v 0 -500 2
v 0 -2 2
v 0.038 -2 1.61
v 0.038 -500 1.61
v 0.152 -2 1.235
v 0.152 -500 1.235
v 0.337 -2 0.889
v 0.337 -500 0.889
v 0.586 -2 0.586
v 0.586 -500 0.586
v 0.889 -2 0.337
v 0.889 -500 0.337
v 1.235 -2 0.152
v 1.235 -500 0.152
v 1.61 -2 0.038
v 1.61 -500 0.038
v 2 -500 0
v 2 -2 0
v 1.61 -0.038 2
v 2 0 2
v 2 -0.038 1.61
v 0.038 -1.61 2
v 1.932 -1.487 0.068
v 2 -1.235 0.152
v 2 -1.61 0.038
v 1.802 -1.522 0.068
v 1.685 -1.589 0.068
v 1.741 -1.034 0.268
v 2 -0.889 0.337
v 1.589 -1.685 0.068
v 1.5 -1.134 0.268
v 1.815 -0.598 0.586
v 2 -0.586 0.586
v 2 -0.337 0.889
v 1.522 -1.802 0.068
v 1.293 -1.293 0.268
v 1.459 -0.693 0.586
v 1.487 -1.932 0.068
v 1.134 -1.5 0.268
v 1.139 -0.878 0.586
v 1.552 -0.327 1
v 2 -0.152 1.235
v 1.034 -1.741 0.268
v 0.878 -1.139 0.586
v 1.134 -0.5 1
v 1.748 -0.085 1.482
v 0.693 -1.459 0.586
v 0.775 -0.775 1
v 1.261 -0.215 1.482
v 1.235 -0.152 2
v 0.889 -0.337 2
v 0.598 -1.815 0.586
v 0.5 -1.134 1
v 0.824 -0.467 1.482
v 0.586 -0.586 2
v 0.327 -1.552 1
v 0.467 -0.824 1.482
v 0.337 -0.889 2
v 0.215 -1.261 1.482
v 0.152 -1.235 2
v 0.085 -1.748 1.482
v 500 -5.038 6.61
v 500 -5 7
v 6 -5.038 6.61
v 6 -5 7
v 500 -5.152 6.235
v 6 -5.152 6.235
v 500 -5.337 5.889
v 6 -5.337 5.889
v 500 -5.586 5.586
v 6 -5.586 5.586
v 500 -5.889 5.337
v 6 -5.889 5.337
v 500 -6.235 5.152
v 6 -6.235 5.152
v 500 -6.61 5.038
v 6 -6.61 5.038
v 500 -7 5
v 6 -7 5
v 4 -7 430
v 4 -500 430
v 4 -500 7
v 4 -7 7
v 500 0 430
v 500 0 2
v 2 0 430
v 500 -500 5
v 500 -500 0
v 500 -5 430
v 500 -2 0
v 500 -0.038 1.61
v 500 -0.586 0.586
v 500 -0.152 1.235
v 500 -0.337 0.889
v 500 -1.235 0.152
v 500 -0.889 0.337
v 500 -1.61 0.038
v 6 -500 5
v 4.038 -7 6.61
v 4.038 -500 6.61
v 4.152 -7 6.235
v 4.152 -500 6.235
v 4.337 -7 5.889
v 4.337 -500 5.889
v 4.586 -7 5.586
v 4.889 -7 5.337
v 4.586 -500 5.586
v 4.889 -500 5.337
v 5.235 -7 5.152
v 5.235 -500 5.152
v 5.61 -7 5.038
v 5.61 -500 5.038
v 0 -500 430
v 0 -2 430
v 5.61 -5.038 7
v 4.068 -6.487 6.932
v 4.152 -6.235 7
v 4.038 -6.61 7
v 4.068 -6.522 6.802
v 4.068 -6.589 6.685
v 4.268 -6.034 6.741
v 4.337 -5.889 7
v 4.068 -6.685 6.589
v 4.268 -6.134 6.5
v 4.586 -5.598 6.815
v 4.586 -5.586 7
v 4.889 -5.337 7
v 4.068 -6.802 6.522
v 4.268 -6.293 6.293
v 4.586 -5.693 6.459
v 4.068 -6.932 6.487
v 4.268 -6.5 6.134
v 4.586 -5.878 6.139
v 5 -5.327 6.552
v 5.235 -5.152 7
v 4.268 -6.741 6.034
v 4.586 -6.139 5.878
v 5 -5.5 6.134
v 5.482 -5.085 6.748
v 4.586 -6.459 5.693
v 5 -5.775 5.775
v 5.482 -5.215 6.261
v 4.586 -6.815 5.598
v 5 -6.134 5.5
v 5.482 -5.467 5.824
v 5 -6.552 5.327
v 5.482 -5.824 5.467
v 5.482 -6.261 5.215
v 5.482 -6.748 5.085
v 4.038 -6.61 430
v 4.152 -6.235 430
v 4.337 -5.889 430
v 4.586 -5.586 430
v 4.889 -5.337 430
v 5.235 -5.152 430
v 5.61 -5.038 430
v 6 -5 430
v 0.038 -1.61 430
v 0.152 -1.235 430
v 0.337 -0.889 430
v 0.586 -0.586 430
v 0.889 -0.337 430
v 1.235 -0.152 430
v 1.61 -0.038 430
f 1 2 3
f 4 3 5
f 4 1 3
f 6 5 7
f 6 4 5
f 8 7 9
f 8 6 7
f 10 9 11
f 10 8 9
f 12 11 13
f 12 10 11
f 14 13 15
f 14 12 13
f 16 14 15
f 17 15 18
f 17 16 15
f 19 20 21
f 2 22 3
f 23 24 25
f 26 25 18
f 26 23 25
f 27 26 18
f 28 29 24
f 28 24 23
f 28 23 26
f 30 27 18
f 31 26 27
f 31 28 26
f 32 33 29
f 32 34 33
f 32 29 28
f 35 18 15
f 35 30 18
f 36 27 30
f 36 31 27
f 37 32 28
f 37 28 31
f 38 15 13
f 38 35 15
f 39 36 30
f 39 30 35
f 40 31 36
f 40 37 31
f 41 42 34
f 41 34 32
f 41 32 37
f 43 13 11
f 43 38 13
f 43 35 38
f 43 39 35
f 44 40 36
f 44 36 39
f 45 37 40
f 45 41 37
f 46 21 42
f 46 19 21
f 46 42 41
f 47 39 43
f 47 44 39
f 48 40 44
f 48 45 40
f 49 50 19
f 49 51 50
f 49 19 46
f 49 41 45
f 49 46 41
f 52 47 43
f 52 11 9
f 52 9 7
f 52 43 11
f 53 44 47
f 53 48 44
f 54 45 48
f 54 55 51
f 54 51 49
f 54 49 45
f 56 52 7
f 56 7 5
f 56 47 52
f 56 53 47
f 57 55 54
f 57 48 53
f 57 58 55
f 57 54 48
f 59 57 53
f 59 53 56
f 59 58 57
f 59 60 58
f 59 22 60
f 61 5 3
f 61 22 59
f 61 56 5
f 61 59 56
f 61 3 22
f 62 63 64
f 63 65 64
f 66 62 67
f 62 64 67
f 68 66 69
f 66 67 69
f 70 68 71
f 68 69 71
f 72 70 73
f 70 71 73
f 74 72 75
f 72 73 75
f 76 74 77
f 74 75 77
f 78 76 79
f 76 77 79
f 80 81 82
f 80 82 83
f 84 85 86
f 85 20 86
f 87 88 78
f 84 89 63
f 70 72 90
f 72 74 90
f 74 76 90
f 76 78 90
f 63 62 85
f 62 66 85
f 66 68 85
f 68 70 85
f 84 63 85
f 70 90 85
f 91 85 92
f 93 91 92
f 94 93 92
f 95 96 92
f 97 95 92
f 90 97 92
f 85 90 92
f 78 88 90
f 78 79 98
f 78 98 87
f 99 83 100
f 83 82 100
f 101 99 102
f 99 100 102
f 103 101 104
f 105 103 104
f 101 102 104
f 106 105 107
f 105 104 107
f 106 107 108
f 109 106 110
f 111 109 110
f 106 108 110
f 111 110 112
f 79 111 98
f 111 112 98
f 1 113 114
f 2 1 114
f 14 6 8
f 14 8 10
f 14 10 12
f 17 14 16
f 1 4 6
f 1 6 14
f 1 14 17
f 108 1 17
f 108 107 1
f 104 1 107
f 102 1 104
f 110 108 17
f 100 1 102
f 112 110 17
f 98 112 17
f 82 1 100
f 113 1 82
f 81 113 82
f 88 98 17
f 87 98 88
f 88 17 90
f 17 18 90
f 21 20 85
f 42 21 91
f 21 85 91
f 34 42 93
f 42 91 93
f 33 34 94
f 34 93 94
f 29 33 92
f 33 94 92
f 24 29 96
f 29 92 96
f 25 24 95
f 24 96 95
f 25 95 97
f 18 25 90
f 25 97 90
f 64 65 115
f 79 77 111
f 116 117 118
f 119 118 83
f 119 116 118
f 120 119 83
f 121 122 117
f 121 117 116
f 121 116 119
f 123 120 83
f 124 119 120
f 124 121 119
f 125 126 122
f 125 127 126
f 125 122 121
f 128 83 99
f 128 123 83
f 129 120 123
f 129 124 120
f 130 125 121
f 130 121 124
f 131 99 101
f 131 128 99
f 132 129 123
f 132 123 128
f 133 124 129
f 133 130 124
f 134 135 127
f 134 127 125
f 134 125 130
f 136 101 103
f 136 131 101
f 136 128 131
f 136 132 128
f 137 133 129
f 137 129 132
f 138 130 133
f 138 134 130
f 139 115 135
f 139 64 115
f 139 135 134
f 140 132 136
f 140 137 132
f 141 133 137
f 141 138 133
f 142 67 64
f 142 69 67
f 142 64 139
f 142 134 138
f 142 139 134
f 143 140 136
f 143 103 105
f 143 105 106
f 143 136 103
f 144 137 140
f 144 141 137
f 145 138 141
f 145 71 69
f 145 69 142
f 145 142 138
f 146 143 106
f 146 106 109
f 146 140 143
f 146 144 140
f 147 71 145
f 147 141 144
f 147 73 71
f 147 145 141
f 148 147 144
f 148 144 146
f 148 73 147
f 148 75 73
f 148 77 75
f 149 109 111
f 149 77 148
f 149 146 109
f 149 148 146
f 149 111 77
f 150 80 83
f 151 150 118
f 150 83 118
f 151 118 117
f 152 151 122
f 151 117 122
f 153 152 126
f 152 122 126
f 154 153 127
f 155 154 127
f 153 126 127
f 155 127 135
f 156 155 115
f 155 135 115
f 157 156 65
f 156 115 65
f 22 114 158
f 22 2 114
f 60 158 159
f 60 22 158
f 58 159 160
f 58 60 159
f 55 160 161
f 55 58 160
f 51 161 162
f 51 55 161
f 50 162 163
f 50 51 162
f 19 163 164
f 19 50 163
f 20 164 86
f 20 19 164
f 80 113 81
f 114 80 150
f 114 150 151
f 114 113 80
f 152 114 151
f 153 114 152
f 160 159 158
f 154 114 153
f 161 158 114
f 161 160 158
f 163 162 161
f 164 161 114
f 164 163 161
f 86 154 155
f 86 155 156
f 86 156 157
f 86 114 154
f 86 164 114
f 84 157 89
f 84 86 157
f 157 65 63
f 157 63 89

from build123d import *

# Parameters (mm, degrees)
F0_W     = 5
F0_H     = 430
F1_DEPTH = 500
F2_W     = 500
F2_H     = 500
F3_DEPTH = 5
F4_W     = 4
F4_H     = 495
F5_DEPTH = 430
F7_R     = 2


# Not quite as in the source:
# - a feature names something its author has since deleted; it is built from what else it names


with BuildPart() as f1:
    # F0 (on Right) → F1 (new body)
    with BuildSketch(Plane.YZ):
        with Locations((-2.5, 215)):
            Rectangle(F0_W, F0_H)
    extrude(amount=F1_DEPTH)

    # F2 (on Top) → F3 (join)
    with BuildSketch(Plane.XY):
        with Locations((250, -250)):
            Rectangle(F2_W, F2_H)
    extrude(amount=F3_DEPTH)


with BuildPart() as f5:
    # F4 (on face) → F5 (new body, through all)
    with BuildSketch(Plane.XY.offset(430)):
        with Locations((2, -252.5)):
            Rectangle(F4_W, F4_H)
    extrude(amount=-F5_DEPTH)

    # F6: union F1
    add(f1.part)

    # F7
    f7_edges = [f5.edges().sort_by_distance(p)[0] for p in [
        (0, 0, 215),
        (250, 0, 0),
        (0, -250, 0),
        (252, -5, 5),
        (4, -5, 217.5),
        (4, -252.5, 5),
    ]]
    fillet(f7_edges, radius=F7_R)


solid = f5.part
